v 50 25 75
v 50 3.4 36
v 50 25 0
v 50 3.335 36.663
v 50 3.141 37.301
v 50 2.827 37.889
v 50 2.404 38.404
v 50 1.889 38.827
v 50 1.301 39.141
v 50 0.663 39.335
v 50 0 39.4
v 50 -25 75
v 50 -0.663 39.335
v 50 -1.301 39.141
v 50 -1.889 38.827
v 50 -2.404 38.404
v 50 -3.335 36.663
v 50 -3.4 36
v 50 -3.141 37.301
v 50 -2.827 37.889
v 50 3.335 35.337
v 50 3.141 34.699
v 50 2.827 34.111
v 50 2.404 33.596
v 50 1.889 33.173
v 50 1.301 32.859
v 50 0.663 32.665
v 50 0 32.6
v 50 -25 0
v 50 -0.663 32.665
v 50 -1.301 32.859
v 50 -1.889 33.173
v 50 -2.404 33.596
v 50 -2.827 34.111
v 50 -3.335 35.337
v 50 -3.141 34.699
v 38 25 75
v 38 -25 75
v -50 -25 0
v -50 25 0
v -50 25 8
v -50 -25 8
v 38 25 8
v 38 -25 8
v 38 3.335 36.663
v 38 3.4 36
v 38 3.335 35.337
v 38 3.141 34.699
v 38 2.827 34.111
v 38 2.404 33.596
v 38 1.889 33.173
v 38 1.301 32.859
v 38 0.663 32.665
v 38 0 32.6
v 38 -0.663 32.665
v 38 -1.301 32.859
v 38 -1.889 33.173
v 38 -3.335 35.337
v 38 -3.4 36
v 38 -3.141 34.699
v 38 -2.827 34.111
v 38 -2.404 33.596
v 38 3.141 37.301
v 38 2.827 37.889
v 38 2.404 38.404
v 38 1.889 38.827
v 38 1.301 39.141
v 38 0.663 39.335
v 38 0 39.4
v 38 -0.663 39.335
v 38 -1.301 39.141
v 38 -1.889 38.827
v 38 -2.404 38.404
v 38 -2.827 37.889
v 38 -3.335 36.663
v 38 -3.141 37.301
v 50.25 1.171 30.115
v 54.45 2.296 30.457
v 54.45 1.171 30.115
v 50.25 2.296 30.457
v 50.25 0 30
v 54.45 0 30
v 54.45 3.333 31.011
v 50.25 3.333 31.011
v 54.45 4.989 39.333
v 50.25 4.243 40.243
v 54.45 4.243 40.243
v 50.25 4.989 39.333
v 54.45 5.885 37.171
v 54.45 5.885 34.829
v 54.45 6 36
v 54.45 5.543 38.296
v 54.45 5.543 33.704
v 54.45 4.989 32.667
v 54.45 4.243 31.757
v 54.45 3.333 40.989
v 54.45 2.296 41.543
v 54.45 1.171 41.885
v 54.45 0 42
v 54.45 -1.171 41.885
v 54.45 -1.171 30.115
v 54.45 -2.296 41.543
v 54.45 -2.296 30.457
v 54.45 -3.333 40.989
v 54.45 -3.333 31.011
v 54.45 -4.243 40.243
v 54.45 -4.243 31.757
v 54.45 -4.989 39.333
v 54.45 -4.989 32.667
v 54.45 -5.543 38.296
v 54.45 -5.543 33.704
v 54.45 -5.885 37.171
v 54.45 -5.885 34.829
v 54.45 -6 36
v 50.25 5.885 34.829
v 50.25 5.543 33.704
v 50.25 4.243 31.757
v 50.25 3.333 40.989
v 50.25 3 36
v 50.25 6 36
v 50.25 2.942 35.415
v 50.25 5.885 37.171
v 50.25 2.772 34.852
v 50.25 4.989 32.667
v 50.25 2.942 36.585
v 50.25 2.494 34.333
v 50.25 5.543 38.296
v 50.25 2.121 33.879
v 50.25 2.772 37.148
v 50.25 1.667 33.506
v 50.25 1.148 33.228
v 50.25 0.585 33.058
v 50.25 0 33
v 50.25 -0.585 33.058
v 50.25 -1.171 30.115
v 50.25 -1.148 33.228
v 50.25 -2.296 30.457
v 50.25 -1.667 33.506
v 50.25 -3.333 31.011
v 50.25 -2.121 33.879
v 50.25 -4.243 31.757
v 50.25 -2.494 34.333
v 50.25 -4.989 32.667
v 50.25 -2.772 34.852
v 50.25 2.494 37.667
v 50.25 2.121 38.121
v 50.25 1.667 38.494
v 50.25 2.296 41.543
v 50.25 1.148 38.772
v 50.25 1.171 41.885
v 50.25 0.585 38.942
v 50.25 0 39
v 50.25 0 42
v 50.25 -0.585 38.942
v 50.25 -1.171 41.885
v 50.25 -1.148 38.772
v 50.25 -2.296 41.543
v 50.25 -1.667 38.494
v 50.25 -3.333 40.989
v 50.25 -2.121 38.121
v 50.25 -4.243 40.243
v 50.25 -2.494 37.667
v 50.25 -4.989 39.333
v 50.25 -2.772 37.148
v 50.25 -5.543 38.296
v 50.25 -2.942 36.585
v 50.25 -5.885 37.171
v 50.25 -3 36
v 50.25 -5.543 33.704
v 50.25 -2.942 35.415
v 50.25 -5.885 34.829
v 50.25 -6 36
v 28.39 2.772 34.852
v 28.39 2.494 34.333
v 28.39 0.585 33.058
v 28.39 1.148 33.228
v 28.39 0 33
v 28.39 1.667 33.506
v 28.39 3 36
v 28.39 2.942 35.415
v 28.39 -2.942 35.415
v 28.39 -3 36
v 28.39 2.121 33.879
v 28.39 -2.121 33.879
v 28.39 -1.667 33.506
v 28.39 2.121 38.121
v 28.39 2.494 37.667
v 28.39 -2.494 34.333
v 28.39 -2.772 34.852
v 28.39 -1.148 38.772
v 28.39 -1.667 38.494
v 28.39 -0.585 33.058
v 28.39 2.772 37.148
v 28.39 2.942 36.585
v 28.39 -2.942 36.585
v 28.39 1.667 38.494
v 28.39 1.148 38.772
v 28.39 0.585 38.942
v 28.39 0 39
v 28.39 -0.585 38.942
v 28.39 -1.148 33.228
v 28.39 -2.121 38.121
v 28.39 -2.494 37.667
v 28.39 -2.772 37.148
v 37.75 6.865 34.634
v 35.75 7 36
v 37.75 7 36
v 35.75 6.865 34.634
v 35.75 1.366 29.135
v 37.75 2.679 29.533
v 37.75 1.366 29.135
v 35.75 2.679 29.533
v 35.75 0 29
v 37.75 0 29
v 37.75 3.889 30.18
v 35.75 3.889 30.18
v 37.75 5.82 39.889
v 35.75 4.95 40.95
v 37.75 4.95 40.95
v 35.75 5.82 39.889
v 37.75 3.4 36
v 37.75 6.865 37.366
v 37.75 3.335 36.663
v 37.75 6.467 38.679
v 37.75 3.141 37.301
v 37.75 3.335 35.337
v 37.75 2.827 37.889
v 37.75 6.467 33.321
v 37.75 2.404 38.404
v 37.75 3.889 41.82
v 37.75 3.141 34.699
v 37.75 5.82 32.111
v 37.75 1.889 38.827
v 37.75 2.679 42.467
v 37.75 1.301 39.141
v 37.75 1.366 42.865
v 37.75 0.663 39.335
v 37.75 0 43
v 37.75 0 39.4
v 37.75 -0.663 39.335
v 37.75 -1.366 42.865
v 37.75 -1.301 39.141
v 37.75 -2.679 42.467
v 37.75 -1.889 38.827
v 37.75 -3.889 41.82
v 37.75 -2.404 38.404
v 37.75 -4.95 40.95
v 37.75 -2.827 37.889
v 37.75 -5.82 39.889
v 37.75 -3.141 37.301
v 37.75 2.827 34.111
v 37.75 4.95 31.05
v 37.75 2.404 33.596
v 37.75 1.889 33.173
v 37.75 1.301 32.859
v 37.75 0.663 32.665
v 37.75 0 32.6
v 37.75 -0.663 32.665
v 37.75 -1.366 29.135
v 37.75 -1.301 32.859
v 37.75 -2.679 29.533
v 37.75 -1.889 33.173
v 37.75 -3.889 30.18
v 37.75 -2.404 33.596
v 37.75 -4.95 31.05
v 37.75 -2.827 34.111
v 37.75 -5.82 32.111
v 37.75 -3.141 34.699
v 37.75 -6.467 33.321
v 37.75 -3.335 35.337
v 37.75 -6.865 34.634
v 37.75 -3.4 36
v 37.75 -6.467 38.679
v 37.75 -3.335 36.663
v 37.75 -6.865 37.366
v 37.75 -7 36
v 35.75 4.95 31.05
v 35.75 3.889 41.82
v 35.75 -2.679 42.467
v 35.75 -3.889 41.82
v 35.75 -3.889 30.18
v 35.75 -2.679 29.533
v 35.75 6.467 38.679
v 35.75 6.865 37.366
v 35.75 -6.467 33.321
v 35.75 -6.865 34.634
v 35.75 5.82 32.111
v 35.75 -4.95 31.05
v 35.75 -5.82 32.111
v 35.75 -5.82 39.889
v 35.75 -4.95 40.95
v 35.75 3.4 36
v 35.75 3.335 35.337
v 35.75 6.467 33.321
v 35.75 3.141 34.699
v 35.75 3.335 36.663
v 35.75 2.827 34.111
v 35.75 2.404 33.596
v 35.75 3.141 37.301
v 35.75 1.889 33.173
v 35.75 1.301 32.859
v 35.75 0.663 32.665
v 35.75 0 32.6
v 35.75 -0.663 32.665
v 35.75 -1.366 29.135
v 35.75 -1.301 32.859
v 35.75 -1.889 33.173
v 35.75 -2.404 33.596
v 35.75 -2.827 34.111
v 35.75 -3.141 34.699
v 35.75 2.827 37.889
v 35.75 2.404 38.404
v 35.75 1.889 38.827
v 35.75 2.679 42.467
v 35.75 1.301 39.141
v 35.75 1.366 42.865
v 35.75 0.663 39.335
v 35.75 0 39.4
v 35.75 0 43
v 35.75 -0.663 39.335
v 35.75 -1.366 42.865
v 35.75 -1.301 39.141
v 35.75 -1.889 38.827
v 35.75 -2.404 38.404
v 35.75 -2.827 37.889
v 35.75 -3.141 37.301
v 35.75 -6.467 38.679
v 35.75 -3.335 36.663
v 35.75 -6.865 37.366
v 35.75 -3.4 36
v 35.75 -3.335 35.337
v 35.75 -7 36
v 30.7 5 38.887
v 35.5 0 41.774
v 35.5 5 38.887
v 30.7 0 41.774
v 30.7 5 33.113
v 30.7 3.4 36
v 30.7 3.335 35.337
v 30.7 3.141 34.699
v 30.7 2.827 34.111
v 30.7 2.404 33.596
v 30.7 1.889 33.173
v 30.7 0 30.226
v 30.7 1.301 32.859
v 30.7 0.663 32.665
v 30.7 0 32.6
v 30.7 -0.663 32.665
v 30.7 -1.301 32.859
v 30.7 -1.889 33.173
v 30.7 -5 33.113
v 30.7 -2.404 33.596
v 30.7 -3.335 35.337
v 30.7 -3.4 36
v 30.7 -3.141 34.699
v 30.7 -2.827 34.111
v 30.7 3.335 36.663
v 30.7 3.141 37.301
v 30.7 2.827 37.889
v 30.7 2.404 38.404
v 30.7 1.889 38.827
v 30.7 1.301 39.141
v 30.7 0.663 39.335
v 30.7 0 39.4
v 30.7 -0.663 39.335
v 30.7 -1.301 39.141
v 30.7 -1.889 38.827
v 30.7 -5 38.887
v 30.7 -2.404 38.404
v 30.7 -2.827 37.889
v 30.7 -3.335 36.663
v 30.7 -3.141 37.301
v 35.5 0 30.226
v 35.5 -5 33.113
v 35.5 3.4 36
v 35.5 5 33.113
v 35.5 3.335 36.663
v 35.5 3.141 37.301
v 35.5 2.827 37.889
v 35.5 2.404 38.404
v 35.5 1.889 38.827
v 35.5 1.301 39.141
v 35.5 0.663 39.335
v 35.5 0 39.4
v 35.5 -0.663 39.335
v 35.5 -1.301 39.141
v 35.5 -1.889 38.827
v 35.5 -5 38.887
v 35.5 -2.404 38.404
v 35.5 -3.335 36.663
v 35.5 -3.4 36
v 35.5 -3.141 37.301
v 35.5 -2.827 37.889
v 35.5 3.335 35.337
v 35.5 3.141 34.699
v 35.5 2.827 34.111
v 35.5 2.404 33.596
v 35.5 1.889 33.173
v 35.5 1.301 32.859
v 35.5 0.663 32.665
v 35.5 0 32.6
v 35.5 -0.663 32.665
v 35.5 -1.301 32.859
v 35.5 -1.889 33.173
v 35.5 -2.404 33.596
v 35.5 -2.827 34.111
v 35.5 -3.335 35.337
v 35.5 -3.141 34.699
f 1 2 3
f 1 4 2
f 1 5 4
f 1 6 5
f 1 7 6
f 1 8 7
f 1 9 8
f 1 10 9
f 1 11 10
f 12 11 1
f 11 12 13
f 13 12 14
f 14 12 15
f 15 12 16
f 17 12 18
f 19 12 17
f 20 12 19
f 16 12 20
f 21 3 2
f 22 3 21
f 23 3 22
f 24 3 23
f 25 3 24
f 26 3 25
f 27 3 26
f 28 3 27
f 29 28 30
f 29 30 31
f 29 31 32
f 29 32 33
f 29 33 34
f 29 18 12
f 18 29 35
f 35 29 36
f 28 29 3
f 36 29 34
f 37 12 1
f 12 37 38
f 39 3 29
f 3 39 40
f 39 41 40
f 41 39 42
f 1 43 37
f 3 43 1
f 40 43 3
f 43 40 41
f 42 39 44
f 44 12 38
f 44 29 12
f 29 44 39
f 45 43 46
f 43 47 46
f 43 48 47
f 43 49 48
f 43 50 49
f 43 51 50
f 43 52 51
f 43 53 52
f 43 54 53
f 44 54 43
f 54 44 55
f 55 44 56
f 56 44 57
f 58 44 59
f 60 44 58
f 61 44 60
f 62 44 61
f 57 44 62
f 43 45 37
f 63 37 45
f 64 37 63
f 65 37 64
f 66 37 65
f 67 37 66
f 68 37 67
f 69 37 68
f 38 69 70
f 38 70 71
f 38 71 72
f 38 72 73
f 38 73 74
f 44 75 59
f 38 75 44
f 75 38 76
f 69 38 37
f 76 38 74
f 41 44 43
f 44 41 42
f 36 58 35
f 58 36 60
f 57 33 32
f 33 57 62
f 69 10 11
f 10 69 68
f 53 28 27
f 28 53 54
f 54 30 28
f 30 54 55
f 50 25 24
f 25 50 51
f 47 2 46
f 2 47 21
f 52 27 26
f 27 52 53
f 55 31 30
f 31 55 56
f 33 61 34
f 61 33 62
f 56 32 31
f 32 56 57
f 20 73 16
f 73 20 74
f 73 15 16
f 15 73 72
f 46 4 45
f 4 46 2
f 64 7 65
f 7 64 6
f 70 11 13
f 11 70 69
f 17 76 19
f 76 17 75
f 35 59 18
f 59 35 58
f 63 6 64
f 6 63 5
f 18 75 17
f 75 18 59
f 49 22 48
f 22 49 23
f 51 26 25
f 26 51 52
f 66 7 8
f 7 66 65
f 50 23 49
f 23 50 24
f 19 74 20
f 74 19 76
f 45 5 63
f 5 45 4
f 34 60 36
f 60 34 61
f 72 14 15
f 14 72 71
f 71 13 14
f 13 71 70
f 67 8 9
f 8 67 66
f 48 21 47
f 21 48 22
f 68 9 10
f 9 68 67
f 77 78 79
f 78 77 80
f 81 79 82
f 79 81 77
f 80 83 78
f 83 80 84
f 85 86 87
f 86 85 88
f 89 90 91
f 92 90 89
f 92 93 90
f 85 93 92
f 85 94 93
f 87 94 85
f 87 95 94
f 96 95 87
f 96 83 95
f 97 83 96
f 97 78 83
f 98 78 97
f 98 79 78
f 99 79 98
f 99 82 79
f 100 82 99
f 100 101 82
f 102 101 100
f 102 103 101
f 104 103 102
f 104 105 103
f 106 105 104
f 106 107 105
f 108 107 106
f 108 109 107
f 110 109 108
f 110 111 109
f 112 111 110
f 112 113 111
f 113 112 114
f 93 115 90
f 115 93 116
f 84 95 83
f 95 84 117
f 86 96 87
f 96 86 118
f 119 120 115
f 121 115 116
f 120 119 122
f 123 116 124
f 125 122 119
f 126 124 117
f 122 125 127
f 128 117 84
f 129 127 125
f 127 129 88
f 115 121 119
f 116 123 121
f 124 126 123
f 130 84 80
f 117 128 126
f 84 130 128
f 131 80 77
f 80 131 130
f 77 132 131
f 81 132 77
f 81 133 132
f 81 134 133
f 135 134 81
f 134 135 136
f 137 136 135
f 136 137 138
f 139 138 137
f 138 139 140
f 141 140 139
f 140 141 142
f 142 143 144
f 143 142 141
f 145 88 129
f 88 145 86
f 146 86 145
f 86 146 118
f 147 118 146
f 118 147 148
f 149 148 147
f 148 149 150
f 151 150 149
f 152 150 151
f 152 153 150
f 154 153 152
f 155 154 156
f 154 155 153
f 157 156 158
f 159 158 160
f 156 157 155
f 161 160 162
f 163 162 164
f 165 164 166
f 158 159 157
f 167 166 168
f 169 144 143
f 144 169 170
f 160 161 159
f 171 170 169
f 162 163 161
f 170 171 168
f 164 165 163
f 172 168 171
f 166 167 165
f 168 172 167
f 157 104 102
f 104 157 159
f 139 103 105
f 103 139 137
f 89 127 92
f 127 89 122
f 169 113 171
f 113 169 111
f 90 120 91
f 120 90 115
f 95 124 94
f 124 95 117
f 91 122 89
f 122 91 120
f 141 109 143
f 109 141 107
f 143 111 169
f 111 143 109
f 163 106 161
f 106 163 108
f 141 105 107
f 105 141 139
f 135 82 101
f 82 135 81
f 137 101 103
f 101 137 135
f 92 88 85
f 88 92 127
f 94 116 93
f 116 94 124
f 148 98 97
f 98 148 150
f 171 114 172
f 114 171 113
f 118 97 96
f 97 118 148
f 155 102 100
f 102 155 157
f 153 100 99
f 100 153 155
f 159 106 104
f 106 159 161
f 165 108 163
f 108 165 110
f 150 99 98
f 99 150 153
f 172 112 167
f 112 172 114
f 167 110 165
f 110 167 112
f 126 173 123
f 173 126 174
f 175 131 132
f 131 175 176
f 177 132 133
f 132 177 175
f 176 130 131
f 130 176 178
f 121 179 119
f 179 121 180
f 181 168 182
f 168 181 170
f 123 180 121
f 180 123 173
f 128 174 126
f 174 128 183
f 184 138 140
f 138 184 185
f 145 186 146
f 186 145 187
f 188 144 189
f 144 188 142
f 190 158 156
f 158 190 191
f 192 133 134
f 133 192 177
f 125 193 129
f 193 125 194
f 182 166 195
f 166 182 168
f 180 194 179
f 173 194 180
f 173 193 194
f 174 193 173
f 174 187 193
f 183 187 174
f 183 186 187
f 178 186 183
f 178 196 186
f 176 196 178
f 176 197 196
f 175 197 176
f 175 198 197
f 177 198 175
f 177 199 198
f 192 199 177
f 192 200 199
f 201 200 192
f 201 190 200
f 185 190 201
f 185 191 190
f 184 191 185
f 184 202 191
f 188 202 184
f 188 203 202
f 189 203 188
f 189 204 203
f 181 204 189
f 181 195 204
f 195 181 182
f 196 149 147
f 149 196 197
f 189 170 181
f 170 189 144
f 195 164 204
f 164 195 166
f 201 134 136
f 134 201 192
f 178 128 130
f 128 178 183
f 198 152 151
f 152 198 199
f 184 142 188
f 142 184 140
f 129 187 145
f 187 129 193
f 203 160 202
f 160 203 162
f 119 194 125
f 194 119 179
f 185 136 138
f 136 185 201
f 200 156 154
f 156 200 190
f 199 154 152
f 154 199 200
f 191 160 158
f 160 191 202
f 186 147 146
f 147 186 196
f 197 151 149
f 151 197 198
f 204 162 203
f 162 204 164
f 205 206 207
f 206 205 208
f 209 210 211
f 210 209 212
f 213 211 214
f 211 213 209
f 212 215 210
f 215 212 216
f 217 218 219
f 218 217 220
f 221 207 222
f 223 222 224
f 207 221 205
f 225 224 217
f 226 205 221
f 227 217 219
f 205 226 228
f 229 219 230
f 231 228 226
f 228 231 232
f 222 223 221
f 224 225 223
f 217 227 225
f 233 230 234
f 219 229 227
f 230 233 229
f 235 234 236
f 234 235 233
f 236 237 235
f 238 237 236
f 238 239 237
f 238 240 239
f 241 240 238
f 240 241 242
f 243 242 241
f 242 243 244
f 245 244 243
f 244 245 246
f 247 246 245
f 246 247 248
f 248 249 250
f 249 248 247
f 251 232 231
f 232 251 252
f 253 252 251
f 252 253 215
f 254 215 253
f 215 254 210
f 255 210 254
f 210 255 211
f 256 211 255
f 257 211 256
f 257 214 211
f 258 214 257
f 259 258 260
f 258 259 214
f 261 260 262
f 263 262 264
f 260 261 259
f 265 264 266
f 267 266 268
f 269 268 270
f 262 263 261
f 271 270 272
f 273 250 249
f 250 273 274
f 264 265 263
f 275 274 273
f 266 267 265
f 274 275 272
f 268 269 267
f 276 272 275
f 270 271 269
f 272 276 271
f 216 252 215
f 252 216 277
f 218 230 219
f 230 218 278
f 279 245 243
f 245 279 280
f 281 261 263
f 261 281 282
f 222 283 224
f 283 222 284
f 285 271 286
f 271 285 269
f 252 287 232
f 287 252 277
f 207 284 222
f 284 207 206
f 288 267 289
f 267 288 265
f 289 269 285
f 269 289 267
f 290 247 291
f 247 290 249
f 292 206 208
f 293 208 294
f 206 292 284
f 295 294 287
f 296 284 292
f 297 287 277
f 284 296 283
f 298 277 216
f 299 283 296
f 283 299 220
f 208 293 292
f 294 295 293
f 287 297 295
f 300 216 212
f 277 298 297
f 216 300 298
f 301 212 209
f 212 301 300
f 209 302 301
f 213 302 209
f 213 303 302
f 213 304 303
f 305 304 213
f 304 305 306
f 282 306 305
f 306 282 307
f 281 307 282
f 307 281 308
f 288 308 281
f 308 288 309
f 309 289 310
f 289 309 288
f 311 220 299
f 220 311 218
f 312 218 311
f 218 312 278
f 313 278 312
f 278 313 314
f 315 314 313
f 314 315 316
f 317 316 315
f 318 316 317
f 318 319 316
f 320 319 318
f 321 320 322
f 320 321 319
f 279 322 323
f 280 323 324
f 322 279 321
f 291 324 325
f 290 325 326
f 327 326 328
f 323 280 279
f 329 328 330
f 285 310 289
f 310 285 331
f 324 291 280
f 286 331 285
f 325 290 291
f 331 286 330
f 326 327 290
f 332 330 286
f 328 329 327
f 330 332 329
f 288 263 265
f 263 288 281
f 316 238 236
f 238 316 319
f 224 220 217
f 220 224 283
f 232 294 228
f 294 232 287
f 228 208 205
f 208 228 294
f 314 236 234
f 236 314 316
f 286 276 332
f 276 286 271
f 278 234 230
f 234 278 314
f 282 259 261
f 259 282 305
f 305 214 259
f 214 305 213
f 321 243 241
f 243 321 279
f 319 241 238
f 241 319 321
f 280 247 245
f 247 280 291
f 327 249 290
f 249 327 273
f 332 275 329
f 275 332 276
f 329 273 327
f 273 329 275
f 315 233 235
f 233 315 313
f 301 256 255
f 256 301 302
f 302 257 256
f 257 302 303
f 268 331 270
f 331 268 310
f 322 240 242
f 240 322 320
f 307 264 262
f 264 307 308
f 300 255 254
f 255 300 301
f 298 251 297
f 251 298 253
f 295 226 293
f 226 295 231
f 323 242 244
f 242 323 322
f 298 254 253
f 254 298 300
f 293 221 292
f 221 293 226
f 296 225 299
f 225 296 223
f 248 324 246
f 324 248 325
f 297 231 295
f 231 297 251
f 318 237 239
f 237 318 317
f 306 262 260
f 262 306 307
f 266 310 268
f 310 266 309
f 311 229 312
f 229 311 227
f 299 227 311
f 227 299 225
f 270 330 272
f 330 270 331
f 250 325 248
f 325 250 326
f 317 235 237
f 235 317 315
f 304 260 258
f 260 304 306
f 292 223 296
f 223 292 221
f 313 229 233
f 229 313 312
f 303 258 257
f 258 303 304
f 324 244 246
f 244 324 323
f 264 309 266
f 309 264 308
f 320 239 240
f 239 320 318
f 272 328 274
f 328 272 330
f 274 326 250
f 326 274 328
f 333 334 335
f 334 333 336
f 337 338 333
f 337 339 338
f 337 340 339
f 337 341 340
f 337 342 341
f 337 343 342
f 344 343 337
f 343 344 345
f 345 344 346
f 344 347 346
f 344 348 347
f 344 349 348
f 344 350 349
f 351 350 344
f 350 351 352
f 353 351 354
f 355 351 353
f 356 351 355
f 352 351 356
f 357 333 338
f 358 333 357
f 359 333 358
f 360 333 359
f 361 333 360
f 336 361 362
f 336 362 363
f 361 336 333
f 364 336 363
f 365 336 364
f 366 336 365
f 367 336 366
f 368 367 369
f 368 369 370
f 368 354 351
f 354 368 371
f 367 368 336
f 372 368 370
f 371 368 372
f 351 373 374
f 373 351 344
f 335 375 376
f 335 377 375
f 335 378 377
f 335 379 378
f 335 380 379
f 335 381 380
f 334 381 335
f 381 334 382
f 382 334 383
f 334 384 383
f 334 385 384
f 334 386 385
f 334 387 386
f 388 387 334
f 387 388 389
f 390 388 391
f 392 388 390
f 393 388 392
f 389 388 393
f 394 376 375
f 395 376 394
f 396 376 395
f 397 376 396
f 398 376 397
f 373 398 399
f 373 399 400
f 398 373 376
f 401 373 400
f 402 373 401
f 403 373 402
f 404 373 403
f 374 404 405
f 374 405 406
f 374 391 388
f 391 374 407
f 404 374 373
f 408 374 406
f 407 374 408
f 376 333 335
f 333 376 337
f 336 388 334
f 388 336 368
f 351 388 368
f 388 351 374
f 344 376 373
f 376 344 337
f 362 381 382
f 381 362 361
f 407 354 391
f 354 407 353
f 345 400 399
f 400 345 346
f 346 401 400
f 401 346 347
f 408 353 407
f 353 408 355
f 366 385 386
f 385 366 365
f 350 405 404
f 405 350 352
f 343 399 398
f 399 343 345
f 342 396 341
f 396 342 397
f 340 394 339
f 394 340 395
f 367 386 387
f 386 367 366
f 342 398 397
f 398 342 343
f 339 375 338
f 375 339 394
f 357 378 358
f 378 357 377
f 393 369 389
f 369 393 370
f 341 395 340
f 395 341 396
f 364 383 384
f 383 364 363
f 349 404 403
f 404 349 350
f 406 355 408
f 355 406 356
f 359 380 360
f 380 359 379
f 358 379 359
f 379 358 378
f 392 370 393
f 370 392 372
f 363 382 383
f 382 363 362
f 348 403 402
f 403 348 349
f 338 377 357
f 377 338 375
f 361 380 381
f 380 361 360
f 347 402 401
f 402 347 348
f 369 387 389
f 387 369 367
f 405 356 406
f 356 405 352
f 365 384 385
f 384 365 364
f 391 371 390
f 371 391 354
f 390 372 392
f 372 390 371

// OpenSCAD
$fn = 32;

// ------------------------------------------------------------------------
// Bolted bracket: 100 x 50 mm bracket with 1 bolt joints
// Every part is its own module, assembly() places them once.
// ------------------------------------------------------------------------

// --- part 1 ---
module bracket() {
  difference() {
    translate([-50, -25, 0]) cube([100, 50, 75]);
    translate([-51, -26, 8]) cube([89, 52, 68]);
    translate([44, 0, 36]) rotate([0, 90, 0]) cylinder(h = 14, d = 6.8, center = true);
  }
}

// --- part 2 ---
module bolt() {
  cylinder(h = 4.2, d = 12);
  translate([0, 0, -21.86]) cylinder(h = 21.86, d = 6);
}

// --- part 3 ---
module washer() {
  difference() {
      translate([0, 0, 0]) cylinder(h = 2, d = 14);
      translate([0, 0, -1]) cylinder(h = 4, d = 6.8);
    }
}

// --- part 4 ---
module nut() {
  difference() {
    linear_extrude(height = 4.8) polygon(points = [[5.774, 0], [2.887, 5], [-2.887, 5], [-5.774, 0], [-2.887, -5], [2.887, -5]]);
    translate([0, 0, -1]) cylinder(h = 6.8, d = 6.8);
  }
}

// --- assembly ---
module assembly() {
  translate([0, 0, 0]) rotate([0, 0, 0]) bracket();
  translate([50.25, 0, 36]) rotate([0, 90, 0]) bolt();
  translate([35.75, 0, 36]) rotate([0, 90, 0]) washer();
  translate([30.7, 0, 36]) rotate([0, 90, 0]) nut();
}

assembly();
